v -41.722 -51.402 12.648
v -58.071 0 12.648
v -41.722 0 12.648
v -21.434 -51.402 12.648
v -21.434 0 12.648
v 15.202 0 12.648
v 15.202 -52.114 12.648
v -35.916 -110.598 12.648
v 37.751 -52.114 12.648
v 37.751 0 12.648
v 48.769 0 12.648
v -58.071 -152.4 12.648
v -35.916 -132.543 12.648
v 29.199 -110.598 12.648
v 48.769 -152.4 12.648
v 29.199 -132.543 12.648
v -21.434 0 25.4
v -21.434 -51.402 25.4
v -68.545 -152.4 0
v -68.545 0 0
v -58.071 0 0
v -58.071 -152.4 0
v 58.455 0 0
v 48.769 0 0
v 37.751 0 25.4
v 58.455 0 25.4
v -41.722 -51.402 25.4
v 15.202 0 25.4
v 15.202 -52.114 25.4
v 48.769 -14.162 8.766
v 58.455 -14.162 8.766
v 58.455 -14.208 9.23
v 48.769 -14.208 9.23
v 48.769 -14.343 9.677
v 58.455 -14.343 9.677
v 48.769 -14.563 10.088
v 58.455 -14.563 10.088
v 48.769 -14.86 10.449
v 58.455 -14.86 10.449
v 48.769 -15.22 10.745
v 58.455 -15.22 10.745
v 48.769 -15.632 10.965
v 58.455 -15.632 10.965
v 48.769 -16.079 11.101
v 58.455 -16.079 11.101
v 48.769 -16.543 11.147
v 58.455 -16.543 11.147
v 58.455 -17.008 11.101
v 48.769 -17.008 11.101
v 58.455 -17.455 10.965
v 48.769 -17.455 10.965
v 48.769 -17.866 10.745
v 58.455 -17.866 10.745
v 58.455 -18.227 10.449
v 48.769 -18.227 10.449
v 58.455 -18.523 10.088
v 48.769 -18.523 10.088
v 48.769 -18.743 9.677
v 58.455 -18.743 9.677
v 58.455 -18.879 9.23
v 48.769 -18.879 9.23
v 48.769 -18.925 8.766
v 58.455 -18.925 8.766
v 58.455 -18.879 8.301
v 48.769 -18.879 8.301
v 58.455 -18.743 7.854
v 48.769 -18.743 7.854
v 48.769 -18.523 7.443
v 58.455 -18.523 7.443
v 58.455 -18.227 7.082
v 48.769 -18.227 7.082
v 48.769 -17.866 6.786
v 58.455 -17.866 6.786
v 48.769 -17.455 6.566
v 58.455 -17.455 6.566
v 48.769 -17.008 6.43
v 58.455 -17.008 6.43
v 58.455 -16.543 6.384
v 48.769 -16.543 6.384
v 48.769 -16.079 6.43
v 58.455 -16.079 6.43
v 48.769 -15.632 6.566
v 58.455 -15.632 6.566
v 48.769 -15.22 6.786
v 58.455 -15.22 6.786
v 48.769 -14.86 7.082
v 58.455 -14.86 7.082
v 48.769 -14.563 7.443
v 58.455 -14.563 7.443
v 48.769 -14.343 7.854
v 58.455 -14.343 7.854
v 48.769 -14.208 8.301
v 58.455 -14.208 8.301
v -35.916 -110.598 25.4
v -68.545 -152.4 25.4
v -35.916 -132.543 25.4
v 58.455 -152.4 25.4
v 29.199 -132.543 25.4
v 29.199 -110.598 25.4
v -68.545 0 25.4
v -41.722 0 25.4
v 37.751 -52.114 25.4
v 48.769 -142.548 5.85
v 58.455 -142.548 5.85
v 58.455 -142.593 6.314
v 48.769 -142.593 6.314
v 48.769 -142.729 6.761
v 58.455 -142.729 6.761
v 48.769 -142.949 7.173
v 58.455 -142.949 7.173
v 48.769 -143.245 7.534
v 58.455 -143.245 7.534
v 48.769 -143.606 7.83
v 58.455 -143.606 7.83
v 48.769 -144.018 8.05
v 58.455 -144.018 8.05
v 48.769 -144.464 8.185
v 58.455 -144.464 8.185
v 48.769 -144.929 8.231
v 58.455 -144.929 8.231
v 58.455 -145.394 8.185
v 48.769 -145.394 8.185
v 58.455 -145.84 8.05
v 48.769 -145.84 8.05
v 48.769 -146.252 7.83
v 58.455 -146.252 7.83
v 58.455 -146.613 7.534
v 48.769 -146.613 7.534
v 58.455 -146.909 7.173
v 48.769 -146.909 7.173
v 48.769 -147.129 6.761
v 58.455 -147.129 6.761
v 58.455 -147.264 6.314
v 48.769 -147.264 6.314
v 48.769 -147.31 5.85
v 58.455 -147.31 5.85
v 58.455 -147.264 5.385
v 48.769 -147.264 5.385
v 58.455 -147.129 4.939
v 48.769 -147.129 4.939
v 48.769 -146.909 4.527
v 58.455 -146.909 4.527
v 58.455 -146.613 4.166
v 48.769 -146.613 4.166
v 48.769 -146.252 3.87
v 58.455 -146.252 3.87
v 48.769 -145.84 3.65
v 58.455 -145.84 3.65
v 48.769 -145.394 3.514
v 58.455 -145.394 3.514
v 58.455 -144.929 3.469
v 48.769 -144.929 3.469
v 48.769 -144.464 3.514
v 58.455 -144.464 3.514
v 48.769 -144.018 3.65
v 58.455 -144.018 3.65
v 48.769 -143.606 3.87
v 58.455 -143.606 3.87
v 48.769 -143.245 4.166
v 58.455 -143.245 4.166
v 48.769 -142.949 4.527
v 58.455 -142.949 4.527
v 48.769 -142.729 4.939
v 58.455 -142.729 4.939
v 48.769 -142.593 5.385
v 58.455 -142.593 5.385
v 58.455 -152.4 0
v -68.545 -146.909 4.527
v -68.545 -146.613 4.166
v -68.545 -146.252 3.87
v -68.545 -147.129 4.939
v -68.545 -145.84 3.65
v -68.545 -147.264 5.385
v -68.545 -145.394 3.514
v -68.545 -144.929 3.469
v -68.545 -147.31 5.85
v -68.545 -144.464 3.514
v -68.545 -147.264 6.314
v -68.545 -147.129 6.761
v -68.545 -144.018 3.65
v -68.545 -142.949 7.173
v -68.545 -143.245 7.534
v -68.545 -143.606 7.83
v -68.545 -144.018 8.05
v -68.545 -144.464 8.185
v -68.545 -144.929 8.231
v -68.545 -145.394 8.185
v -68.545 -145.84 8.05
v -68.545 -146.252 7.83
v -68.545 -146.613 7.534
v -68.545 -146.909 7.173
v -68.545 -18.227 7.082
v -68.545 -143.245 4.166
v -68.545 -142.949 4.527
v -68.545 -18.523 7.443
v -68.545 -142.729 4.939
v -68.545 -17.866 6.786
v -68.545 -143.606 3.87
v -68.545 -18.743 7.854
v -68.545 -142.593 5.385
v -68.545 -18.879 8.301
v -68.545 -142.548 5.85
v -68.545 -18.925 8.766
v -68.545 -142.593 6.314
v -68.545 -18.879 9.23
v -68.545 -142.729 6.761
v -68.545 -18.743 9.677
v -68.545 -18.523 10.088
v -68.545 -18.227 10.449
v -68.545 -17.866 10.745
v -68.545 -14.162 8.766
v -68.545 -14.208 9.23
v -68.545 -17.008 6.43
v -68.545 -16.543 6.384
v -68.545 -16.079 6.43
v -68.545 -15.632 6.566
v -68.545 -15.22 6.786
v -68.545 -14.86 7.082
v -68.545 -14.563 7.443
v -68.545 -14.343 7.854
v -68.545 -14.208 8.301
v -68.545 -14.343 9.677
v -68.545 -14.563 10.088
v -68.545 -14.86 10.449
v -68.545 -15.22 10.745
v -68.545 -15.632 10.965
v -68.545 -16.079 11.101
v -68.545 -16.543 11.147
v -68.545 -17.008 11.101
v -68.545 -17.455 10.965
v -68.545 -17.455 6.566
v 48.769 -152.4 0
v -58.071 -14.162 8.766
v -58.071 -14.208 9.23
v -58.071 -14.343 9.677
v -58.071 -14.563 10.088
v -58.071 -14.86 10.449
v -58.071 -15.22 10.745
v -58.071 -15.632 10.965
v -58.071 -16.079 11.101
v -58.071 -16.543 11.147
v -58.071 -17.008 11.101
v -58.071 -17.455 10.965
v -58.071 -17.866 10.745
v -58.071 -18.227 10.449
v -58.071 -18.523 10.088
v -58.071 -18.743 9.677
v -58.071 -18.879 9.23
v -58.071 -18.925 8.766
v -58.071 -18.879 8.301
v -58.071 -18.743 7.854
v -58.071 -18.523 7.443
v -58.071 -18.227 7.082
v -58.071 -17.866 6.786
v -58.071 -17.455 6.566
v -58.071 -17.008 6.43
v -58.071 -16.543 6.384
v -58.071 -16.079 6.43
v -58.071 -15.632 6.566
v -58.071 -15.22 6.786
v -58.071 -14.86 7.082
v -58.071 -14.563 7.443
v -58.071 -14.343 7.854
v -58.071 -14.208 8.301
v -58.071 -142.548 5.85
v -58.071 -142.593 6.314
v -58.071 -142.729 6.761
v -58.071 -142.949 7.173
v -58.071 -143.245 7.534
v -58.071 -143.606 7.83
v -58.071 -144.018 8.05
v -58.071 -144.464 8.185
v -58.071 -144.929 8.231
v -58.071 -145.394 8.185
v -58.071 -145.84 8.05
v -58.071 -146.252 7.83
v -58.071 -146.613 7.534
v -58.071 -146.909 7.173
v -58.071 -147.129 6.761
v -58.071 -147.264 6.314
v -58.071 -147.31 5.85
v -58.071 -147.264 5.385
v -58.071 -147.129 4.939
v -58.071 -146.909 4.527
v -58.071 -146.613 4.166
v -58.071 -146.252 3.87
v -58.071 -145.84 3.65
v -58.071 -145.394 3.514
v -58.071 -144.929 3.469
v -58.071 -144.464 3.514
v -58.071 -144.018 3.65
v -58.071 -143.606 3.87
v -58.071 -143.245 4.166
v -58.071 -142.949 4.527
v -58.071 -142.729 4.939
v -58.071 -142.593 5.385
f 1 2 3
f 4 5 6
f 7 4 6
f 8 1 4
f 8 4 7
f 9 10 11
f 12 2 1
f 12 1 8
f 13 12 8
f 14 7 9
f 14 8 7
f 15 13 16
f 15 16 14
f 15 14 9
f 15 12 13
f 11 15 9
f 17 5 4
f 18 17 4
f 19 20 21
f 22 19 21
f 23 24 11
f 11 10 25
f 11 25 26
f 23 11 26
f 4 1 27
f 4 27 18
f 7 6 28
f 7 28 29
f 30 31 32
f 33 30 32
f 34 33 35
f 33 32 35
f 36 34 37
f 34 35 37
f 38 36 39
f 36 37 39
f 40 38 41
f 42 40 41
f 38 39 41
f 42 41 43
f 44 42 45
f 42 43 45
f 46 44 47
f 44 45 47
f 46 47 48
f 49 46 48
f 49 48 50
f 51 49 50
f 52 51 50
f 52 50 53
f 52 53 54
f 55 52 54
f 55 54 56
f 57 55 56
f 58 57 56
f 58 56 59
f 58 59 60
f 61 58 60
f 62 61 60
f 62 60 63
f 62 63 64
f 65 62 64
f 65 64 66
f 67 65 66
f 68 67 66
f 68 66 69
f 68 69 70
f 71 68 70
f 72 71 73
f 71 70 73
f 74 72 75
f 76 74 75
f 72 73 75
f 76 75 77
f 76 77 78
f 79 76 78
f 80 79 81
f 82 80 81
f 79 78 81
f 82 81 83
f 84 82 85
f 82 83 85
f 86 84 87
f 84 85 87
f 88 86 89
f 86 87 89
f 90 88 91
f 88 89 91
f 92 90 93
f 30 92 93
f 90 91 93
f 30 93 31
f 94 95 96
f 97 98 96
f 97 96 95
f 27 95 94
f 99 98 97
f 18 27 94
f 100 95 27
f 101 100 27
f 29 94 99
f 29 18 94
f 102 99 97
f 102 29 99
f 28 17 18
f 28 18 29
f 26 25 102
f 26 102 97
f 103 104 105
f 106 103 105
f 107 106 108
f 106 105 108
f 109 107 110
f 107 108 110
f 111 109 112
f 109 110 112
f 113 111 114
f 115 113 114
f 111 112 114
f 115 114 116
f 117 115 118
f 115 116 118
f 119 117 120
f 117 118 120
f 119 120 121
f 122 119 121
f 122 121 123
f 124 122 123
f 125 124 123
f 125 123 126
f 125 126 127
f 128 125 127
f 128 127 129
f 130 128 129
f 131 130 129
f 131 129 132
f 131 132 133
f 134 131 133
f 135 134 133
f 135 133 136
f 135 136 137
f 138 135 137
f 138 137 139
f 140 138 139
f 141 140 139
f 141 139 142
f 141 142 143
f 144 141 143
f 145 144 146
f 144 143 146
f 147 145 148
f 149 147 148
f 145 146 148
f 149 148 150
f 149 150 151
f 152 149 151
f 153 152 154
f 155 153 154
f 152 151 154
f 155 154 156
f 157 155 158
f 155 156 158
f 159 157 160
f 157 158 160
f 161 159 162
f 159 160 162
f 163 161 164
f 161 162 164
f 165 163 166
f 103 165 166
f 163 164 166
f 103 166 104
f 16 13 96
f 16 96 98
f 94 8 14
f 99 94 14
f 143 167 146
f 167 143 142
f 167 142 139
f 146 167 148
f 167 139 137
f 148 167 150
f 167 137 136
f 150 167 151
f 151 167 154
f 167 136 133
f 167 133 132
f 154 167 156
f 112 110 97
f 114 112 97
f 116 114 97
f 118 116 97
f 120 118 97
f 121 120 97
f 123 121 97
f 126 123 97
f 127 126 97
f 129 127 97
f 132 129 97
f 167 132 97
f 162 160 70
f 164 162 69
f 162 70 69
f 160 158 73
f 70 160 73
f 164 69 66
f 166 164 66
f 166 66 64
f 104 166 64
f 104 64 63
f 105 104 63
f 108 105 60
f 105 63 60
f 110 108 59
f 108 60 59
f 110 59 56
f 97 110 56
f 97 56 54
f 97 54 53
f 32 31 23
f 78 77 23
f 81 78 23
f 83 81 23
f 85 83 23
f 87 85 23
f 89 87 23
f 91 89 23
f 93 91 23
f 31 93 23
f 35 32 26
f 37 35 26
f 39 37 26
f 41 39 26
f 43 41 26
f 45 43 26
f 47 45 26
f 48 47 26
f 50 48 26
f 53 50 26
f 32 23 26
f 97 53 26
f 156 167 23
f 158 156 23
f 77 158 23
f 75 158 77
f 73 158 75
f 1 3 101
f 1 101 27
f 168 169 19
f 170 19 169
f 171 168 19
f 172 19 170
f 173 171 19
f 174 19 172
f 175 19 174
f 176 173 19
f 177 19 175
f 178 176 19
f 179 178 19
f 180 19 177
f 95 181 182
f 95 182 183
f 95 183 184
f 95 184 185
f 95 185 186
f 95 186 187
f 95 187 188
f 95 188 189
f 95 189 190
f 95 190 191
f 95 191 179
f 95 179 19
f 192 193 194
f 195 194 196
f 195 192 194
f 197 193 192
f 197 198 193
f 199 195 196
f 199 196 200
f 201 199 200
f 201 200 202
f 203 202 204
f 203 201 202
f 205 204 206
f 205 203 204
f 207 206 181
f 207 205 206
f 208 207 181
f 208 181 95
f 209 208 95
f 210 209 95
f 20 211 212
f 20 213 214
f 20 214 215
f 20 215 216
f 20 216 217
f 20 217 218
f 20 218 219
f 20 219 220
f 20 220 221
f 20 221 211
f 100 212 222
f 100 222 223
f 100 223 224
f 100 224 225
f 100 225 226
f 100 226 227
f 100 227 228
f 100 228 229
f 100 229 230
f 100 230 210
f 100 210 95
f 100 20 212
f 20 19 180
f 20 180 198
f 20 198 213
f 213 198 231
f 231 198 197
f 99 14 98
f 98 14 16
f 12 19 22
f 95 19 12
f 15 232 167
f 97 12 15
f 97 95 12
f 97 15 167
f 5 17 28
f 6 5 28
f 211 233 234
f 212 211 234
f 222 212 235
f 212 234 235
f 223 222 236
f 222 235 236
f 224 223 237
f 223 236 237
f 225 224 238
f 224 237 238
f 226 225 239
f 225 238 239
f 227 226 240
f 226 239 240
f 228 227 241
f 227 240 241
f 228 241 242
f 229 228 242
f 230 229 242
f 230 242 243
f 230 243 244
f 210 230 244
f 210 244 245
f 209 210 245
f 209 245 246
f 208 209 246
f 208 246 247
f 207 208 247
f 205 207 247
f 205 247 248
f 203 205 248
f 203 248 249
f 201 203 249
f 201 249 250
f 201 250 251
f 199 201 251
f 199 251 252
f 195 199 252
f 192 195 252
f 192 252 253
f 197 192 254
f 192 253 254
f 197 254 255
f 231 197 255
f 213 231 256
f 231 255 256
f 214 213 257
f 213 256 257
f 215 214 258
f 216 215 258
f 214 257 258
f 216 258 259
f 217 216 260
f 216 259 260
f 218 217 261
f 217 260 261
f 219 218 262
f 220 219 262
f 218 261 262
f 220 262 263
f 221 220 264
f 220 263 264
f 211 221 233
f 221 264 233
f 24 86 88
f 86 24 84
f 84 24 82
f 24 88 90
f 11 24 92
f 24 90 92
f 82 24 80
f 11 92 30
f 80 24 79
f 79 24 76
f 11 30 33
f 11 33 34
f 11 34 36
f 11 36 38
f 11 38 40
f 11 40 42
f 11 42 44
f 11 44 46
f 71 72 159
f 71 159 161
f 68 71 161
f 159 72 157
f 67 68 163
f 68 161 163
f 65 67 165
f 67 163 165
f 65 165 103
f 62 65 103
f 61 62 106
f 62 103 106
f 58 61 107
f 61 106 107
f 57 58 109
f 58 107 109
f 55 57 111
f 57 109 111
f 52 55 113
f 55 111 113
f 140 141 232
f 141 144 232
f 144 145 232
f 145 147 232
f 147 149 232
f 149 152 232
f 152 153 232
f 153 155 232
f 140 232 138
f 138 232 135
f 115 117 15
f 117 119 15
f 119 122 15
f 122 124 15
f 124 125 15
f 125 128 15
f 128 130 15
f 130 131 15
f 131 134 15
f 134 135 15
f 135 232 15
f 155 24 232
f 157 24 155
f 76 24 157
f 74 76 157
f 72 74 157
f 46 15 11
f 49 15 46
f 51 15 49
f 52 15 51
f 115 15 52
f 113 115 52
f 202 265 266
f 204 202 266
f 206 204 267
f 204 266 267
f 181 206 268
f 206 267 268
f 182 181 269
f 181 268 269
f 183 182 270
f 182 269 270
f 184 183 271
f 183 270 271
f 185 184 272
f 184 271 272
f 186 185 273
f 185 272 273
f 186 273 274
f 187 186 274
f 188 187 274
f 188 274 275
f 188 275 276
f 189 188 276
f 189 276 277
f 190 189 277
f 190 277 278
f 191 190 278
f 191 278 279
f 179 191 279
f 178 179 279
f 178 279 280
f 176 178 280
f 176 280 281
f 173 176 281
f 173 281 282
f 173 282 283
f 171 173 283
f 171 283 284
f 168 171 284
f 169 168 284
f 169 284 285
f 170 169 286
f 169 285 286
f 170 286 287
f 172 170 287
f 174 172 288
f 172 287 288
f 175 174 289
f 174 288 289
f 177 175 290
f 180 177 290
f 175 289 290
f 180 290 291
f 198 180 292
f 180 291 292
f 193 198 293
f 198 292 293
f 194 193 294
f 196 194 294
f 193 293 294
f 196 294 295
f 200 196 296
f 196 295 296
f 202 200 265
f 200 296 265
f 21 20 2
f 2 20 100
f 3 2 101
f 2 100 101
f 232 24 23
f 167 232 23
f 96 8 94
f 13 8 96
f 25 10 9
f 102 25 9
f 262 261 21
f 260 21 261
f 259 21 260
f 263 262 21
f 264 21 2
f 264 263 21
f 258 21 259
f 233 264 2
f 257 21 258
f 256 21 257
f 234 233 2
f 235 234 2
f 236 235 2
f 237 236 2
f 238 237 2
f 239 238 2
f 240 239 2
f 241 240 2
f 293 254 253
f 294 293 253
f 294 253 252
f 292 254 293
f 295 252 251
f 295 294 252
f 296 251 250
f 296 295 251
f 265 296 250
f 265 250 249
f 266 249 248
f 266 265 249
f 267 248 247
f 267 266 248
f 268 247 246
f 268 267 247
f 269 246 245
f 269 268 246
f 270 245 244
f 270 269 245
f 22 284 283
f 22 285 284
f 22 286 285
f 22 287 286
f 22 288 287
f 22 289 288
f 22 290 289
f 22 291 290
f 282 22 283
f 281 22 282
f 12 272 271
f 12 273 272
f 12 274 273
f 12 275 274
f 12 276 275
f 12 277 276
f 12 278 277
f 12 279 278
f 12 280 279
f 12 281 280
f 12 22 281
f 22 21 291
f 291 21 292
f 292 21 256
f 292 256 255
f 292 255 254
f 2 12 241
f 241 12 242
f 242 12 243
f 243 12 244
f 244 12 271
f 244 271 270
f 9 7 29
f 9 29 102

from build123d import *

# Parameters (mm, degrees)
F0_W      = 127
F0_H      = 25.4
F1_DEPTH  = 152.4
F2_W      = 106.8398617208
F2_H      = 12.6475254074
F3_DEPTH  = 152.401
F4_R      = 2.38125
F5_DEPTH  = 127.001
F6_R      = 2.38125
F7_DEPTH  = 127.001
F8_W      = 22.5498136133
F8_H      = 52.1139763296
F9_DEPTH  = 12.7534745926
F10_W     = 20.2880082652
F10_H     = 51.4018163085
F11_DEPTH = 12.7534745926
F12_W     = 65.1156418025
F12_H     = 21.9442248344
F13_DEPTH = 12.7534745926


with BuildPart() as f1:
    # F0 (on Front) → F1 (new body)
    with BuildSketch(Plane.XZ):
        with Locations((-5.044566528, 12.7)):
            Rectangle(F0_W, F0_H)
    extrude(amount=F1_DEPTH)

    # F2 (on face) → F3 (cut, through all)
    with BuildSketch(Plane.XZ.offset(152.4)):
        with Locations((-4.6506356448, 6.3237627037)):
            Rectangle(F2_W, F2_H)
    extrude(amount=-F3_DEPTH, mode=Mode.SUBTRACT)

    # F4 (on face) → F5 (cut, through all)
    with BuildSketch(Plane.YZ.offset(58.455433472)):
        with Locations((-16.5433734655, 8.7655037642)):
            Circle(F4_R)
    extrude(amount=-F5_DEPTH, mode=Mode.SUBTRACT)

    # F6 (on face) → F7 (cut, through all)
    with BuildSketch(Plane.YZ.offset(58.455433472)):
        with Locations((-144.9289917946, 5.8498084545)):
            Circle(F6_R)
    extrude(amount=-F7_DEPTH, mode=Mode.SUBTRACT)

    # F8 (on face) → F9 (cut, through all)
    with BuildSketch(Plane(origin=(0, 0, 12.6475254074), x_dir=(1, 0, 0), z_dir=(0, 0, -1))):
        with Locations((26.4765219763, 26.0569881648)):
            Rectangle(F8_W, F8_H)
    extrude(amount=-F9_DEPTH, mode=Mode.SUBTRACT)

    # F10 (on face) → F11 (cut, through all)
    with BuildSketch(Plane(origin=(0, 0, 12.6475254074), x_dir=(1, 0, 0), z_dir=(0, 0, -1))):
        with Locations((-31.5784798004, 25.7009081542)):
            Rectangle(F10_W, F10_H)
    extrude(amount=-F11_DEPTH, mode=Mode.SUBTRACT)

    # F12 (on face) → F13 (cut, through all)
    with BuildSketch(Plane(origin=(0, 0, 12.6475254074), x_dir=(1, 0, 0), z_dir=(0, 0, -1))):
        with Locations((-3.3583734185, 121.5704679489)):
            Rectangle(F12_W, F12_H)
    extrude(amount=-F13_DEPTH, mode=Mode.SUBTRACT)


solid = f1.part
